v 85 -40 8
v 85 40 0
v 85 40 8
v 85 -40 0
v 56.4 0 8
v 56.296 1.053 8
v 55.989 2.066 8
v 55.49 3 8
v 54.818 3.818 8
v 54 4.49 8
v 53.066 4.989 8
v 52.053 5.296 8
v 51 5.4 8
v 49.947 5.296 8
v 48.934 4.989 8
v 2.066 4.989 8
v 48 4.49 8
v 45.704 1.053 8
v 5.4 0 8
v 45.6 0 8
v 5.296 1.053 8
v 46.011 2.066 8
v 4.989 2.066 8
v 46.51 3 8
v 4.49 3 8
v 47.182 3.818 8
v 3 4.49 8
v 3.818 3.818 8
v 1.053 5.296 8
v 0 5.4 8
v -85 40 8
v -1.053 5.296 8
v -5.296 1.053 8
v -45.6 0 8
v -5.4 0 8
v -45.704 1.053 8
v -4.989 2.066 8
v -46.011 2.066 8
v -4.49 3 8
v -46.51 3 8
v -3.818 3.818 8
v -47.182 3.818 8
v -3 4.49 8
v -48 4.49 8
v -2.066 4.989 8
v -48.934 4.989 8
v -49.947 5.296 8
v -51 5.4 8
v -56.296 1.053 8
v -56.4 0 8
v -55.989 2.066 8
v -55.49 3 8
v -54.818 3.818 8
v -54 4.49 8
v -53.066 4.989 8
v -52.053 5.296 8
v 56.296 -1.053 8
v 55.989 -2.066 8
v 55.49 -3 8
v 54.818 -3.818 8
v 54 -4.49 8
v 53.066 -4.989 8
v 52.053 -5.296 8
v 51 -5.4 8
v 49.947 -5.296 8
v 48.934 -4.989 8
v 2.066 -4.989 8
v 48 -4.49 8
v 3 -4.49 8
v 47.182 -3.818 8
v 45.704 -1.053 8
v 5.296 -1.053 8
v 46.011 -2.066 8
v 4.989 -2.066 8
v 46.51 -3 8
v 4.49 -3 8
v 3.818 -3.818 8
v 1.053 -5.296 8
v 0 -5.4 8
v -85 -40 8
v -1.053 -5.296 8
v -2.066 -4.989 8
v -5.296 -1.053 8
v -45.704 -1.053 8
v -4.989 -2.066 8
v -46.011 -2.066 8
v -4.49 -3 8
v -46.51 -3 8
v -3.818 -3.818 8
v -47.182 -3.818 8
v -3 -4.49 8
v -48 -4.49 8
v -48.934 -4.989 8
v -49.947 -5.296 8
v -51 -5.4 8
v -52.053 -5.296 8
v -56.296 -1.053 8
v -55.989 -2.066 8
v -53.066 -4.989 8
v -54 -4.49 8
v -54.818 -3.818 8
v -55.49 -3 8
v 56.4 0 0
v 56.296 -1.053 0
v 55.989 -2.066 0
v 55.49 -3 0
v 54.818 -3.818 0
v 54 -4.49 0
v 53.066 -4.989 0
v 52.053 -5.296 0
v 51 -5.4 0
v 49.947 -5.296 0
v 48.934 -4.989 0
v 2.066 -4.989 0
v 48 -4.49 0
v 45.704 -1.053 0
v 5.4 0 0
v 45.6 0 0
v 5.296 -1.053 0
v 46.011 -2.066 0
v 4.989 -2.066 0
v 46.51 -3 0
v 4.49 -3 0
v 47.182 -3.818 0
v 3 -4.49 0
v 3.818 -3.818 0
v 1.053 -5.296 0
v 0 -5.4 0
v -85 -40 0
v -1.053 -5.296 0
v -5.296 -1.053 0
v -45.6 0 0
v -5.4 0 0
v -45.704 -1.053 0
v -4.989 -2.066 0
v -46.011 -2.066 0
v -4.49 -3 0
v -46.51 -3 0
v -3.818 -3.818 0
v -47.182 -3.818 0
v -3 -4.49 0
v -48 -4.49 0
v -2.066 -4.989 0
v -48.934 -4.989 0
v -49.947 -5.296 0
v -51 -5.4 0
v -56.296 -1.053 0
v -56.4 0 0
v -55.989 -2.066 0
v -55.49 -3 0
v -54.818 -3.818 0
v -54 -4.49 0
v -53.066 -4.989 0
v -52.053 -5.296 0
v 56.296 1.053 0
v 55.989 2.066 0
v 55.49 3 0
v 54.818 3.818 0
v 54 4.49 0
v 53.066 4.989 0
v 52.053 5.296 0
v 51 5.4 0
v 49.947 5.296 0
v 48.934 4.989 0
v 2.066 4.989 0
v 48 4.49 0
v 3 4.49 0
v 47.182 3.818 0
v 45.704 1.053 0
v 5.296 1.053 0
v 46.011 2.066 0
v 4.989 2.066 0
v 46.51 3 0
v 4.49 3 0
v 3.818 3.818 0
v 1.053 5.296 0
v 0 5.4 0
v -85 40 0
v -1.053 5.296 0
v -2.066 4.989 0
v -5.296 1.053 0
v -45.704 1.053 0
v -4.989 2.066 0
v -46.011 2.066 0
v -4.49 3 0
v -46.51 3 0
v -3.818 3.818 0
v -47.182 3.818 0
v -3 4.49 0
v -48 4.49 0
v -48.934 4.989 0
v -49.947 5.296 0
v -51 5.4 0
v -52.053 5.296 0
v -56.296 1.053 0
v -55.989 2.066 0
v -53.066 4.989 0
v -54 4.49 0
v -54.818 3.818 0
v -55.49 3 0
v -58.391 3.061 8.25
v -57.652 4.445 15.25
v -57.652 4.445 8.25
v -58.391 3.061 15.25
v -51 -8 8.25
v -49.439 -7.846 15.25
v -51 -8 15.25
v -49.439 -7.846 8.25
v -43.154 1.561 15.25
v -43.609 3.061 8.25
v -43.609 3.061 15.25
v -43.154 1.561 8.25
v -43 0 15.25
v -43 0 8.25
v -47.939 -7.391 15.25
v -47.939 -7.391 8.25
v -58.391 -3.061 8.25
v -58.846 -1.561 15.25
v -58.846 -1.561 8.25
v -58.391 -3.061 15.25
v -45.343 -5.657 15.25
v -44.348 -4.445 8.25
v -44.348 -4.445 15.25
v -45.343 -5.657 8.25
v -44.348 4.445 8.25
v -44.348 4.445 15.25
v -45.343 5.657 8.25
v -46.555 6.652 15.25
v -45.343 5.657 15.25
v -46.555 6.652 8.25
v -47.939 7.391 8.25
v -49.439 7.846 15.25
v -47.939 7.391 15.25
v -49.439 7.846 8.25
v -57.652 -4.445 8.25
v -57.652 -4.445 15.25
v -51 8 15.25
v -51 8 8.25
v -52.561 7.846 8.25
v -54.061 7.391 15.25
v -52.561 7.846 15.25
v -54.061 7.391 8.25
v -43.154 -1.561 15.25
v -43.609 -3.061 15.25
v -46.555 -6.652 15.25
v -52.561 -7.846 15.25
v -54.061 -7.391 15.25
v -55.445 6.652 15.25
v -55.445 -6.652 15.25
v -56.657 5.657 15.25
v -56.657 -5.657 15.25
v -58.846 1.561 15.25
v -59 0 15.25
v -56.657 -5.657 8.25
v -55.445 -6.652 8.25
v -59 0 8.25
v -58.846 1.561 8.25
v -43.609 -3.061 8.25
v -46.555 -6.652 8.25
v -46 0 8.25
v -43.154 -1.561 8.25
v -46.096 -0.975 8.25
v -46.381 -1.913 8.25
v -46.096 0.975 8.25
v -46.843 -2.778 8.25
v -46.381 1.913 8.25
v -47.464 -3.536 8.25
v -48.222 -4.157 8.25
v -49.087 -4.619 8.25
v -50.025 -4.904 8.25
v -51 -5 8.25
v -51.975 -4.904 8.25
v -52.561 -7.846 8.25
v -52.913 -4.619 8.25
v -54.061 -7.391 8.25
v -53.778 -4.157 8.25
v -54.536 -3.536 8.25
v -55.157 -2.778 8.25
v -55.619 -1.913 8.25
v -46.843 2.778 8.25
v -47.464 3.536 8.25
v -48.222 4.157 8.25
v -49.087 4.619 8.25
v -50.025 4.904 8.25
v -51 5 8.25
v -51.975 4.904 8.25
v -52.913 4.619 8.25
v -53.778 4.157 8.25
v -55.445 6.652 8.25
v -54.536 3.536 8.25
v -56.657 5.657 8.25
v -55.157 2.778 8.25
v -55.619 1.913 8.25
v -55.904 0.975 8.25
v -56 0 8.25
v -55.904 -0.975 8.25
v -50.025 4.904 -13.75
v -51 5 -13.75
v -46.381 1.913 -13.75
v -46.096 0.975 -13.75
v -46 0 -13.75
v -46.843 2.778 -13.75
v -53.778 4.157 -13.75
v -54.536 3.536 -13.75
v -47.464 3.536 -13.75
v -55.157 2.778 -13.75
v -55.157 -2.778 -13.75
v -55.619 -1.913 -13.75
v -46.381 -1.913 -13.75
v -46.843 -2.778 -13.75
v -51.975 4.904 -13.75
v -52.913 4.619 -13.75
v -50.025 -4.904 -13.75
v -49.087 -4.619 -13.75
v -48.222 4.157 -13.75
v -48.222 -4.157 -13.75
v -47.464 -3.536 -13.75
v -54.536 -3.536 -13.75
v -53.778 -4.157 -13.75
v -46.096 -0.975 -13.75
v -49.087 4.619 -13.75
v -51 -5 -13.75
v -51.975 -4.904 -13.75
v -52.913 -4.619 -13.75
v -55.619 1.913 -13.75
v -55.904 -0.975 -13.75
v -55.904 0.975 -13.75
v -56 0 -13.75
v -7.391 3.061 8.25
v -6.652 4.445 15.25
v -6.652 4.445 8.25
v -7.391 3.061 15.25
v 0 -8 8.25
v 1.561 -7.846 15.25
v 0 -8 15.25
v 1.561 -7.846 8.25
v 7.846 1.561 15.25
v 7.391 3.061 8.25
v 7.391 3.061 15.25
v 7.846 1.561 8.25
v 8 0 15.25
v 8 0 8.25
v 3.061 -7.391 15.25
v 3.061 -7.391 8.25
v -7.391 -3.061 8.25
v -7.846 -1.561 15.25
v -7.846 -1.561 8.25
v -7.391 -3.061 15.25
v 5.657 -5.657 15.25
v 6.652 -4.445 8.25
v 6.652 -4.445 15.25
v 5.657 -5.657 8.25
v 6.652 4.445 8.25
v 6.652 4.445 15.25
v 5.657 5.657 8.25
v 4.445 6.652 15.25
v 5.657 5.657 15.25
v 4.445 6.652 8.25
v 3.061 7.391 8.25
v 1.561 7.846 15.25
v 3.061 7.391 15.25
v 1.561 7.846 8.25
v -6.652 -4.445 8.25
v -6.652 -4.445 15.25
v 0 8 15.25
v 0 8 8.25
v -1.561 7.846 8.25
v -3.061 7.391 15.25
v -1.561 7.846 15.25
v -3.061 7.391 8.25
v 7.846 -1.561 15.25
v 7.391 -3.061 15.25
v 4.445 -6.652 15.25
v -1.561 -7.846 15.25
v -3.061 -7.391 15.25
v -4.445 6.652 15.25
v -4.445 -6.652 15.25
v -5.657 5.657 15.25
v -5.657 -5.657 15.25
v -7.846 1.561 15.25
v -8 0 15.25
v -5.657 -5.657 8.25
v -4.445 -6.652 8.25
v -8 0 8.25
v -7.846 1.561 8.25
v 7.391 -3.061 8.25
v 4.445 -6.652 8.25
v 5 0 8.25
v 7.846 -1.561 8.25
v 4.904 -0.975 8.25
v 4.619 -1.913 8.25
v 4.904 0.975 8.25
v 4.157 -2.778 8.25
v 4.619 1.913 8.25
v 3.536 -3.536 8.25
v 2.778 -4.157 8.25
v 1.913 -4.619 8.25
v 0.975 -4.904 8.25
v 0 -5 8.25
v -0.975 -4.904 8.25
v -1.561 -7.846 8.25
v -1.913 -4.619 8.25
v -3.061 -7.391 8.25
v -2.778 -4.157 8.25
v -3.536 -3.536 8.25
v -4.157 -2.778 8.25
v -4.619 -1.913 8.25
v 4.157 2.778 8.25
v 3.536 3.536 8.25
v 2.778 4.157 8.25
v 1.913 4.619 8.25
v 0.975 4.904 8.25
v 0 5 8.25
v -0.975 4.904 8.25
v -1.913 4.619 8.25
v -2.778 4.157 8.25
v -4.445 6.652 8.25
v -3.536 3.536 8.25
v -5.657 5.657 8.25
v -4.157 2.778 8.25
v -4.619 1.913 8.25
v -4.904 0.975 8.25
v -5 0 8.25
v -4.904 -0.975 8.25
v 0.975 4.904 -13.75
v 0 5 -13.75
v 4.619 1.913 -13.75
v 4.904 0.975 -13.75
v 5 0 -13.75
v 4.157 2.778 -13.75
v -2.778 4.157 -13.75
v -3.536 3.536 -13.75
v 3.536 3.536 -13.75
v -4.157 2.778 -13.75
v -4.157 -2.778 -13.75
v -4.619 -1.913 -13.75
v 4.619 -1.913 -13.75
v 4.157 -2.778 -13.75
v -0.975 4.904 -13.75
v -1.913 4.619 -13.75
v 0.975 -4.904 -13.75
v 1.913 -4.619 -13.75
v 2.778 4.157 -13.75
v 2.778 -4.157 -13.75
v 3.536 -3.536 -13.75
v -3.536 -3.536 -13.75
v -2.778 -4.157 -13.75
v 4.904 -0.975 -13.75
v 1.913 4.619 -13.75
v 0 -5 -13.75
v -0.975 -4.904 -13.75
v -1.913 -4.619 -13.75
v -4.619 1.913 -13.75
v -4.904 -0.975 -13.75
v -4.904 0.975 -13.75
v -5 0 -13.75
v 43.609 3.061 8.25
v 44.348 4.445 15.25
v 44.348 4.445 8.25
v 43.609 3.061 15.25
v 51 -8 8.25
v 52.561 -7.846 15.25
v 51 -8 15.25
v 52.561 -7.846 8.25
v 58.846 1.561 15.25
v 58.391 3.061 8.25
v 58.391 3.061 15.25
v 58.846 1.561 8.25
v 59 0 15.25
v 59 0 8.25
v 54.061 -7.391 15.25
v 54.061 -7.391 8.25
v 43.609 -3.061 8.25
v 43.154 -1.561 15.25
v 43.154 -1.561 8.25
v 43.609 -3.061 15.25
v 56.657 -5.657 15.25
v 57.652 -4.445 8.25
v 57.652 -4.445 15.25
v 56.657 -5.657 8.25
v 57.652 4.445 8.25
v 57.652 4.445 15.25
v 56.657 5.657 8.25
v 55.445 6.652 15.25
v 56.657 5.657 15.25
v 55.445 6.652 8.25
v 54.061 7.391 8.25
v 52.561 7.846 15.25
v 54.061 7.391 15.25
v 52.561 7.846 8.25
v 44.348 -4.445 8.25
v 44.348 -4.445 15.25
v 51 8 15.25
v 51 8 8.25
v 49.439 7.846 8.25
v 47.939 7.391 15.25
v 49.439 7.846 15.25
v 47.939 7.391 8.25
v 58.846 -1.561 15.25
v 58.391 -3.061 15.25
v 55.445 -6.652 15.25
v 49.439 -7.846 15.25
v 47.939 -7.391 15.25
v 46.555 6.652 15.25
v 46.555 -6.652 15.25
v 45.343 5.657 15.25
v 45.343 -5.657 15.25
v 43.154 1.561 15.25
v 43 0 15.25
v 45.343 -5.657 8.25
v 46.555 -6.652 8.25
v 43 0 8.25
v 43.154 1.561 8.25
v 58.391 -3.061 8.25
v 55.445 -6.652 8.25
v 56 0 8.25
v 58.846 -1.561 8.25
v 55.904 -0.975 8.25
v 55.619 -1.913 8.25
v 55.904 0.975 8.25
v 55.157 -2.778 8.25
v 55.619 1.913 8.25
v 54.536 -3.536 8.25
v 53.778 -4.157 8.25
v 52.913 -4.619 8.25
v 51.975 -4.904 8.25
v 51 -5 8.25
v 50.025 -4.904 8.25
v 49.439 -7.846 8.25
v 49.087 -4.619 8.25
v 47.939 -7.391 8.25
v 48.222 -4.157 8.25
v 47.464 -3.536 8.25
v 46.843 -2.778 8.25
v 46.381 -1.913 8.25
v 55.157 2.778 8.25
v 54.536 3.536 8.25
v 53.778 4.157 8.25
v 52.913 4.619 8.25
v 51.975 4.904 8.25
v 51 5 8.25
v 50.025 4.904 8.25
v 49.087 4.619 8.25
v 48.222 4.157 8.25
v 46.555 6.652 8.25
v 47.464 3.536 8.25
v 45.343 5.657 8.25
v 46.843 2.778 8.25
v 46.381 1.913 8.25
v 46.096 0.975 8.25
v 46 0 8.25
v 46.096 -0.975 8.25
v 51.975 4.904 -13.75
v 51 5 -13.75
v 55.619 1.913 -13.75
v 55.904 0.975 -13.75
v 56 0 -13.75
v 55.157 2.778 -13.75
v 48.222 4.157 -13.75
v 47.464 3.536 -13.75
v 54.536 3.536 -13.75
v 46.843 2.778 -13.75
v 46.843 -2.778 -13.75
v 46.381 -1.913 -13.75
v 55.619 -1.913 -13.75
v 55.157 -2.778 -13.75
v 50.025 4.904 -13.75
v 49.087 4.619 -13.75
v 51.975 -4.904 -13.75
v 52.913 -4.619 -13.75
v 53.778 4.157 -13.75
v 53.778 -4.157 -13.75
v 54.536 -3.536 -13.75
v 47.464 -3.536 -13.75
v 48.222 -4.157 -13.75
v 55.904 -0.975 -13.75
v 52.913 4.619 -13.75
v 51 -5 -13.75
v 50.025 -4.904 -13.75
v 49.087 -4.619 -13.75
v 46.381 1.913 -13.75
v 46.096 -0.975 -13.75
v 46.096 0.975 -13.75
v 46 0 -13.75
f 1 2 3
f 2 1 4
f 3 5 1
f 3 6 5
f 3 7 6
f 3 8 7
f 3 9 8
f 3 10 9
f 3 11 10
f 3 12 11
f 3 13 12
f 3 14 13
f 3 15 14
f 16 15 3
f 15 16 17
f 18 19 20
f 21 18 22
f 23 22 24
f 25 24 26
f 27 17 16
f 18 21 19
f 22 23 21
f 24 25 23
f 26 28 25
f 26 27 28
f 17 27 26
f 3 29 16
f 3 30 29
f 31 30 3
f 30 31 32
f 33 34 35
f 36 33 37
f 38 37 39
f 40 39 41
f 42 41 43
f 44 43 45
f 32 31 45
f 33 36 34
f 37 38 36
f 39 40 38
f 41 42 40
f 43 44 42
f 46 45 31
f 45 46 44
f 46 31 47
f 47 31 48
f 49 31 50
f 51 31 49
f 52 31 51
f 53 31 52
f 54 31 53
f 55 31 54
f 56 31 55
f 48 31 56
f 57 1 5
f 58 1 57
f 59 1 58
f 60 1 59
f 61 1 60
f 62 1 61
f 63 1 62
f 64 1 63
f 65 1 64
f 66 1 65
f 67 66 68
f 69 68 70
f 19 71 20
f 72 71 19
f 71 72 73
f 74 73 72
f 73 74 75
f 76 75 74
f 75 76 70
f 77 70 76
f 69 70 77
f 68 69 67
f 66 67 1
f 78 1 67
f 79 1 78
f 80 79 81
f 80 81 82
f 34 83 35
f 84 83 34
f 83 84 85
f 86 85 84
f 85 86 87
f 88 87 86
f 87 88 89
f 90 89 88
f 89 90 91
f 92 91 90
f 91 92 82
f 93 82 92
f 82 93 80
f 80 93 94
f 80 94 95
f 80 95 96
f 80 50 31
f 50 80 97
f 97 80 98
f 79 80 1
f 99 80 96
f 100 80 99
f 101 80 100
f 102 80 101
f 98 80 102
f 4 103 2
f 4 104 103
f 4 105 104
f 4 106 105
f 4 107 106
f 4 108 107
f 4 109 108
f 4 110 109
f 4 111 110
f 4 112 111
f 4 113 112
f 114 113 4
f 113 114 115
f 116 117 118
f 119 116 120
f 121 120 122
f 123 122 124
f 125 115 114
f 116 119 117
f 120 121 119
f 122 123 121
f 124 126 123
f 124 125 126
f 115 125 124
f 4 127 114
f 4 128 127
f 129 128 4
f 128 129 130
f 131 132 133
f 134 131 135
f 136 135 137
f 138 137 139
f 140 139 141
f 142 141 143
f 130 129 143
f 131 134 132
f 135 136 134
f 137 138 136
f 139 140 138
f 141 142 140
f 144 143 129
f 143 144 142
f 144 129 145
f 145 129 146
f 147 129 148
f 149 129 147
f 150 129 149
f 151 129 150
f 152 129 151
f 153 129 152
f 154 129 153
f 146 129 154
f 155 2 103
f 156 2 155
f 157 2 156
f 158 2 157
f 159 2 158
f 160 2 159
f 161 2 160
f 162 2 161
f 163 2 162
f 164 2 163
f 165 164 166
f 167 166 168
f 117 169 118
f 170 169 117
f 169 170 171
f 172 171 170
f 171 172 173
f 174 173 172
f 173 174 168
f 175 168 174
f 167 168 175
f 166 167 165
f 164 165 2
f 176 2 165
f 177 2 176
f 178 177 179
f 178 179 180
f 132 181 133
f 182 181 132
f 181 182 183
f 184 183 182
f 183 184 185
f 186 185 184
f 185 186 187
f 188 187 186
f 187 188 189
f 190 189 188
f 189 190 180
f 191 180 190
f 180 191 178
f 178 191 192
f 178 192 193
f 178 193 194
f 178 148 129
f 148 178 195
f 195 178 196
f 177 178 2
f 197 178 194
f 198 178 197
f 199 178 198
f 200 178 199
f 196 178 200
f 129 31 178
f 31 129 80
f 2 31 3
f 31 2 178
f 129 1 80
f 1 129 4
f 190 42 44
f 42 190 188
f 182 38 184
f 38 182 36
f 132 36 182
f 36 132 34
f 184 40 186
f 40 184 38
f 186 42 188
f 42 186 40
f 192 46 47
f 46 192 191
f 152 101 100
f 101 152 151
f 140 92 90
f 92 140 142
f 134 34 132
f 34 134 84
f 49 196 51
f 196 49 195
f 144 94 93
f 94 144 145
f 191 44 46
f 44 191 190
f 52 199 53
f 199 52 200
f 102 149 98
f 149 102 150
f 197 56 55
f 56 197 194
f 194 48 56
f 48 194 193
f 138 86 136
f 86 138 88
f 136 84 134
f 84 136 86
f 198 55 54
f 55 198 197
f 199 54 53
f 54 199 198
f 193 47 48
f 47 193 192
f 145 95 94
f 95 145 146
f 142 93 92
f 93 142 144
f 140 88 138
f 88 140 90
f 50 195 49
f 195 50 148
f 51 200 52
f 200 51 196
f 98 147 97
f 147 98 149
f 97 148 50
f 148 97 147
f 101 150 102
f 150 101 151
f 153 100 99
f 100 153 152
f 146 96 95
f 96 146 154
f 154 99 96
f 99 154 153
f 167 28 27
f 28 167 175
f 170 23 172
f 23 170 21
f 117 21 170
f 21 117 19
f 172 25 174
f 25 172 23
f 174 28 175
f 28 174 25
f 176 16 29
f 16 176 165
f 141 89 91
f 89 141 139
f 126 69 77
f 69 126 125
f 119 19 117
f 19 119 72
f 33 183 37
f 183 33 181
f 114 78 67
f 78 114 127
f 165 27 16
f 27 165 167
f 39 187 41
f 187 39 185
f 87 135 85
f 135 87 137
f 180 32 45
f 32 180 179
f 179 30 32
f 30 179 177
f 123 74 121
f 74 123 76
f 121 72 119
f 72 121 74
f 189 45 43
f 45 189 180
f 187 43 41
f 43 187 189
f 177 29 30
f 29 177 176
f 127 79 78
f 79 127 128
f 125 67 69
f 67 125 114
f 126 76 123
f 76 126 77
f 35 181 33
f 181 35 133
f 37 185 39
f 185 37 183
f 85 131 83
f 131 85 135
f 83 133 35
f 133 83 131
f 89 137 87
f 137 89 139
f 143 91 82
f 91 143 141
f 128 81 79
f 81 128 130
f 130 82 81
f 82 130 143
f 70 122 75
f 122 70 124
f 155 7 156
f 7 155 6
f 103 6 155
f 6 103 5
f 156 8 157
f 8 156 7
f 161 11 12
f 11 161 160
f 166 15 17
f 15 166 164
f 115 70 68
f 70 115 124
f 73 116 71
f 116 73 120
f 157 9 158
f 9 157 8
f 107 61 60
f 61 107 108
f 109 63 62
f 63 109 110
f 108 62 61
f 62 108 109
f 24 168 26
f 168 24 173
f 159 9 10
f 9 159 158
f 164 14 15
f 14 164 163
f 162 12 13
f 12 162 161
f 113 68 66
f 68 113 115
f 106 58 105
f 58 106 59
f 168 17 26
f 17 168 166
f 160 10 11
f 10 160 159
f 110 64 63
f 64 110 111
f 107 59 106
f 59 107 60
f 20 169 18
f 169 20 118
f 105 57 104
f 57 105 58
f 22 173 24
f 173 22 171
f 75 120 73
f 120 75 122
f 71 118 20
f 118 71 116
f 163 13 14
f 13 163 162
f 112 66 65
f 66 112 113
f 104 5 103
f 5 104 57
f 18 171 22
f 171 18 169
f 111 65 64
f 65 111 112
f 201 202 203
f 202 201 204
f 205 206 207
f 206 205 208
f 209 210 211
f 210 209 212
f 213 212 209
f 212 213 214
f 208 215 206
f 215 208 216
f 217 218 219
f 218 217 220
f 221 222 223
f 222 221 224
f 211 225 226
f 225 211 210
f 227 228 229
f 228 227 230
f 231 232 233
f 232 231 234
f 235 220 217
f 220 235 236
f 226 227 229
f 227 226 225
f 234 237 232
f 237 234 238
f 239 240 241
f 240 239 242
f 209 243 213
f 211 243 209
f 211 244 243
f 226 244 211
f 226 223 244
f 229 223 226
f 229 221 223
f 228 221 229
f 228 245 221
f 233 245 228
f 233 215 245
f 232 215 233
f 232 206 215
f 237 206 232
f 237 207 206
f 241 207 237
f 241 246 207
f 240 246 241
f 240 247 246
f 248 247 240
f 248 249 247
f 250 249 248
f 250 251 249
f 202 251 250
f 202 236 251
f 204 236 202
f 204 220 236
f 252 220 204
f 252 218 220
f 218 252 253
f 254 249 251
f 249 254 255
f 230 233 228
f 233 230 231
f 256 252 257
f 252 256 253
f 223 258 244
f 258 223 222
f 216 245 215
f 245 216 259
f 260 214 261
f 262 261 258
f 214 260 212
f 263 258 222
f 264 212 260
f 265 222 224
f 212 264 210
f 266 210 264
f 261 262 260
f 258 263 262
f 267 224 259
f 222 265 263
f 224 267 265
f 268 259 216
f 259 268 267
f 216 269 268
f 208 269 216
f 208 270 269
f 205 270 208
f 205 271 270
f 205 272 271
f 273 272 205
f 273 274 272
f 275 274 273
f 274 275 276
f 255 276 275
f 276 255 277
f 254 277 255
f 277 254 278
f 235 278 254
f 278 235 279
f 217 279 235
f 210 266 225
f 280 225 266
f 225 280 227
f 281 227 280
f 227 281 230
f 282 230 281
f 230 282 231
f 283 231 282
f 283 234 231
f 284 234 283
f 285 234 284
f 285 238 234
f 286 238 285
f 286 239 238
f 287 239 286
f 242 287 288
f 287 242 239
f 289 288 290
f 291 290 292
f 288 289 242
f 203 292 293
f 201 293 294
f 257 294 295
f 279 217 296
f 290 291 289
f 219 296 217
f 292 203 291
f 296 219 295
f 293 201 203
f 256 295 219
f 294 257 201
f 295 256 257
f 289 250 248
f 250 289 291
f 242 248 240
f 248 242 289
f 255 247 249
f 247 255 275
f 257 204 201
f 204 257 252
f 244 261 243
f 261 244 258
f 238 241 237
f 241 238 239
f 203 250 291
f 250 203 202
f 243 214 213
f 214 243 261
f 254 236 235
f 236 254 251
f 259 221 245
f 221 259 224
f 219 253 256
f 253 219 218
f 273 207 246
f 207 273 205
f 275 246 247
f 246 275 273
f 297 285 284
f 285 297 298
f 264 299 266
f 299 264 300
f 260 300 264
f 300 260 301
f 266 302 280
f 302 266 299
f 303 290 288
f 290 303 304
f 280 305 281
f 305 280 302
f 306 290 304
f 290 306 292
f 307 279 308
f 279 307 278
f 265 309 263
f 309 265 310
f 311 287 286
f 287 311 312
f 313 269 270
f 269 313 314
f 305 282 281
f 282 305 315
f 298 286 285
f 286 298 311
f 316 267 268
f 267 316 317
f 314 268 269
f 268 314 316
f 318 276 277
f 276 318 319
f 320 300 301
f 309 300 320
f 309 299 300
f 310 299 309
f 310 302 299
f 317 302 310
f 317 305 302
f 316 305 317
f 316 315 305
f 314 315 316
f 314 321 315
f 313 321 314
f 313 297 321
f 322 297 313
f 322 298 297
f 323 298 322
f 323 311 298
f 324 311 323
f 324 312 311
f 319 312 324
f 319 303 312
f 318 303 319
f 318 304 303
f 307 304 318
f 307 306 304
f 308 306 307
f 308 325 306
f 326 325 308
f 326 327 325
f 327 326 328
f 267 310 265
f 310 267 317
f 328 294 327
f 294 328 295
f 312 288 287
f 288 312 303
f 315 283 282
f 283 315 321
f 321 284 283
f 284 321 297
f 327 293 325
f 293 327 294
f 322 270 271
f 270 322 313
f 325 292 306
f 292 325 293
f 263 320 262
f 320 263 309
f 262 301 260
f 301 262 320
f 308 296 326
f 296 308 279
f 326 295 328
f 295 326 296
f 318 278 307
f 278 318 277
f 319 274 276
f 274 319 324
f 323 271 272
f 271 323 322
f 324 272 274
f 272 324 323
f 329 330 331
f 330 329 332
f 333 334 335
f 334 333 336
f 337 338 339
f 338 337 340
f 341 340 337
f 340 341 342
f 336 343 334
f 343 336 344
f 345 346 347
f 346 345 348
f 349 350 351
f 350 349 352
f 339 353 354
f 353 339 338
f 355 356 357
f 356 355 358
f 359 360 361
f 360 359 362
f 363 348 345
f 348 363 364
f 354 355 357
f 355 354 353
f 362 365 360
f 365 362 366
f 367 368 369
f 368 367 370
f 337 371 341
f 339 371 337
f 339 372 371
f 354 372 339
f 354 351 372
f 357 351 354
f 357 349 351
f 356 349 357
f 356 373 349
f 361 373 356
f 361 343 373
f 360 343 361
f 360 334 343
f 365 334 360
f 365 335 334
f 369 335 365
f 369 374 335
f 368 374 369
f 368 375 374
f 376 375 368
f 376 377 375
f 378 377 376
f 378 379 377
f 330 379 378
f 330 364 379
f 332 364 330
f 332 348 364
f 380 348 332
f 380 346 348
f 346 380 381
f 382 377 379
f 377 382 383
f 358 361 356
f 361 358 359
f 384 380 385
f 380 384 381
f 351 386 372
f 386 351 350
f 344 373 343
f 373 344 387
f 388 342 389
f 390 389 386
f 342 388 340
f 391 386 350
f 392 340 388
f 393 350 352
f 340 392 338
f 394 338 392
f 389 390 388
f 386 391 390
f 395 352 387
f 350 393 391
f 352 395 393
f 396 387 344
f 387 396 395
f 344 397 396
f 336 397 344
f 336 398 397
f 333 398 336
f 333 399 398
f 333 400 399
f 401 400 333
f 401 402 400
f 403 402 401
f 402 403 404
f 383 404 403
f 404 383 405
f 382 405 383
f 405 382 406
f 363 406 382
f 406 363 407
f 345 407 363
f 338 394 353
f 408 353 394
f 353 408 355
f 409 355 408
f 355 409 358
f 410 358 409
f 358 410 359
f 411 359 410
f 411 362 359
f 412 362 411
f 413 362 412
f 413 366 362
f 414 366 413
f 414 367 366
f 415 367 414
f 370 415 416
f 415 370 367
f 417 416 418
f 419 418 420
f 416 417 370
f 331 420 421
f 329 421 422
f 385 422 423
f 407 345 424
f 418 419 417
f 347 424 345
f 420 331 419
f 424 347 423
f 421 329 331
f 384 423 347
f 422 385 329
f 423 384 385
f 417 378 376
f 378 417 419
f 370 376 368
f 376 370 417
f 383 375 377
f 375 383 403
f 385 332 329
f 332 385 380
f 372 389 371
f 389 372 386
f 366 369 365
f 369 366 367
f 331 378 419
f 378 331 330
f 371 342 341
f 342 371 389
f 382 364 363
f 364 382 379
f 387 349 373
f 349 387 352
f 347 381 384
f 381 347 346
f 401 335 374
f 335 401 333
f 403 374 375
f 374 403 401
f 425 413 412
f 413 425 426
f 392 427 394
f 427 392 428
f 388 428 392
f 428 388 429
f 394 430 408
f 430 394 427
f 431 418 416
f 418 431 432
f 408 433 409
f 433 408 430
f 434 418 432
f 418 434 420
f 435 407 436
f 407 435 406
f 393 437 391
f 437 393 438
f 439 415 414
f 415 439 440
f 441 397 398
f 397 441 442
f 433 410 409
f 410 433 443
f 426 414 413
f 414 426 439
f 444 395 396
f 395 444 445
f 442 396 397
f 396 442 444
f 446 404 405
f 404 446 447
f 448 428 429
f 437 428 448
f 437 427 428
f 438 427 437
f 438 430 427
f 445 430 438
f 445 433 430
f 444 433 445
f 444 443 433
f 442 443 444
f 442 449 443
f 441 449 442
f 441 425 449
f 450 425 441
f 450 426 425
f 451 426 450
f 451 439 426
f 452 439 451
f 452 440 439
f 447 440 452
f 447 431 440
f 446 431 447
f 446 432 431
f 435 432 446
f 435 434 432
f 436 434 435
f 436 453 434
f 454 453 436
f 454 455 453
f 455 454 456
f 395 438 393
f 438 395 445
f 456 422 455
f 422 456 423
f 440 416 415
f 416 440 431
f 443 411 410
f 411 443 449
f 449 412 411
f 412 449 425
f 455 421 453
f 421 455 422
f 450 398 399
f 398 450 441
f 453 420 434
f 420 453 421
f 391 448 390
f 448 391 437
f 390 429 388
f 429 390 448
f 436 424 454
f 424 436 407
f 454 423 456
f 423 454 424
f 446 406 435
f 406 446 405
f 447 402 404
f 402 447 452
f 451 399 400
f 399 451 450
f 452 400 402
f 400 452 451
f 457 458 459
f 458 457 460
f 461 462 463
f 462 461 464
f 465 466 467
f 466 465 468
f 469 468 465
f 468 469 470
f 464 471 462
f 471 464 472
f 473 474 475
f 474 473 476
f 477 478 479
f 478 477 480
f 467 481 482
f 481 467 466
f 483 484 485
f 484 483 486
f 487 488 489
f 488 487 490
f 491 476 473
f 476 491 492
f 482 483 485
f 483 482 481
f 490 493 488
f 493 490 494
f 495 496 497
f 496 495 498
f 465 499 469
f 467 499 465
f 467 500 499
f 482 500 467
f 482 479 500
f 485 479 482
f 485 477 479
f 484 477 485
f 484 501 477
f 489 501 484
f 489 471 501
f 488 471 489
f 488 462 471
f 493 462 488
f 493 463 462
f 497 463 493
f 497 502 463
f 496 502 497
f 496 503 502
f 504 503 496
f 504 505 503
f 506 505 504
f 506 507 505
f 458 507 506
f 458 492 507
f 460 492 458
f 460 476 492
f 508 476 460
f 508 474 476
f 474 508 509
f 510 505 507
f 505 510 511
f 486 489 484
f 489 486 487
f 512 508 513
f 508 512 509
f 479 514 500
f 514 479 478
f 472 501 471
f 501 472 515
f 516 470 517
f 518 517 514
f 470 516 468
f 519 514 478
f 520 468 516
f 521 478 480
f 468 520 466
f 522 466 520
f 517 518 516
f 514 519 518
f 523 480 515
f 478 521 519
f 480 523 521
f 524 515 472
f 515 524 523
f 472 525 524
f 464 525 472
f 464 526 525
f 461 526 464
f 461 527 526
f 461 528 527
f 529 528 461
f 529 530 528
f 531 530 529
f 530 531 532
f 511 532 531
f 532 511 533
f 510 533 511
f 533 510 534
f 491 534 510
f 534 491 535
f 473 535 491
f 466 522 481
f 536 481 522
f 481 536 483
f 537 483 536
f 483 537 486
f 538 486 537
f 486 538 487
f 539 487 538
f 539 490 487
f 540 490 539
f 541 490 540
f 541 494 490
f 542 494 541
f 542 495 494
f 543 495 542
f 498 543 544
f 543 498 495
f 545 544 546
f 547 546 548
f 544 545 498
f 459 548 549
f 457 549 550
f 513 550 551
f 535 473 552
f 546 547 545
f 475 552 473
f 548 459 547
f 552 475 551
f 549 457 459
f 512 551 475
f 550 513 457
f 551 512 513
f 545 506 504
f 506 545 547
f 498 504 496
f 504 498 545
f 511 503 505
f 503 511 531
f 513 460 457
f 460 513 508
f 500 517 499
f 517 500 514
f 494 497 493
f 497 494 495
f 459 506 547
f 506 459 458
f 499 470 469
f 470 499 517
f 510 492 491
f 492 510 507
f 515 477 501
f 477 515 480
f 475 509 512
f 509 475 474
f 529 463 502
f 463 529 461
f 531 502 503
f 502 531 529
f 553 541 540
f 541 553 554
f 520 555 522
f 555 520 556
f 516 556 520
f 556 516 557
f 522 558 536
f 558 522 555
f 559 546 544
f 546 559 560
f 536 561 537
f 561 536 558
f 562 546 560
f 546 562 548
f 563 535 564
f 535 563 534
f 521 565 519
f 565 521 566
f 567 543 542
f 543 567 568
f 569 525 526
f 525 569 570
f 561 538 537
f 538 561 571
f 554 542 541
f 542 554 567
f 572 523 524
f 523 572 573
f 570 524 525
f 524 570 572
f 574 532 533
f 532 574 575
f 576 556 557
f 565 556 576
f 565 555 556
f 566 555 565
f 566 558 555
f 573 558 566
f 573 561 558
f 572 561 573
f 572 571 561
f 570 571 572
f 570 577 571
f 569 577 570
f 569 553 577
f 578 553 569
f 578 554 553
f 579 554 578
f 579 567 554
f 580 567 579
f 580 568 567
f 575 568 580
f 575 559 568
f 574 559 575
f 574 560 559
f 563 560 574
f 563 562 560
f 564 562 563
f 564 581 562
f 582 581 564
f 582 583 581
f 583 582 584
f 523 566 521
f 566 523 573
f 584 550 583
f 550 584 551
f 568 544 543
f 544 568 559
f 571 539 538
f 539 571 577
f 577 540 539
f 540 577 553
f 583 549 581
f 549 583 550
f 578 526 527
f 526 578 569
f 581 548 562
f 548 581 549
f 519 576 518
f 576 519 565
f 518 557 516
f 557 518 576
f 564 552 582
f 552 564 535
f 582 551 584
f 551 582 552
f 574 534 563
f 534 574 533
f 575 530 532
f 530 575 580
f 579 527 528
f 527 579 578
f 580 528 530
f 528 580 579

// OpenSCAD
$fn = 32;

// ------------------------------------------------------------------------
// Bolted plate: 170 x 80 x 8 mm plate, 3 fasteners
// Every part is its own module, assembly() places them once.
// ------------------------------------------------------------------------

// --- part 1 ---
module plate() {
  difference() {
    translate([-85, -40, 0]) cube([170, 80, 8]);
    translate([-51, 0, -1]) cylinder(h = 10, d = 10.8);
    translate([0, 0, -1]) cylinder(h = 10, d = 10.8);
    translate([51, 0, -1]) cylinder(h = 10, d = 10.8);
  }
}

// --- part 2 ---
module bolt1() {
  cylinder(h = 7, d = 16);
  translate([0, 0, -22]) cylinder(h = 22, d = 10);
}

// --- part 3 ---
module bolt2() {
  cylinder(h = 7, d = 16);
  translate([0, 0, -22]) cylinder(h = 22, d = 10);
}

// --- part 4 ---
module bolt3() {
  cylinder(h = 7, d = 16);
  translate([0, 0, -22]) cylinder(h = 22, d = 10);
}

// --- assembly ---
module assembly() {
  translate([0, 0, 0]) rotate([0, 0, 0]) plate();
  translate([-51, 0, 8.25]) rotate([0, 0, 0]) bolt1();
  translate([0, 0, 8.25]) rotate([0, 0, 0]) bolt2();
  translate([51, 0, 8.25]) rotate([0, 0, 0]) bolt3();
}

assembly();
